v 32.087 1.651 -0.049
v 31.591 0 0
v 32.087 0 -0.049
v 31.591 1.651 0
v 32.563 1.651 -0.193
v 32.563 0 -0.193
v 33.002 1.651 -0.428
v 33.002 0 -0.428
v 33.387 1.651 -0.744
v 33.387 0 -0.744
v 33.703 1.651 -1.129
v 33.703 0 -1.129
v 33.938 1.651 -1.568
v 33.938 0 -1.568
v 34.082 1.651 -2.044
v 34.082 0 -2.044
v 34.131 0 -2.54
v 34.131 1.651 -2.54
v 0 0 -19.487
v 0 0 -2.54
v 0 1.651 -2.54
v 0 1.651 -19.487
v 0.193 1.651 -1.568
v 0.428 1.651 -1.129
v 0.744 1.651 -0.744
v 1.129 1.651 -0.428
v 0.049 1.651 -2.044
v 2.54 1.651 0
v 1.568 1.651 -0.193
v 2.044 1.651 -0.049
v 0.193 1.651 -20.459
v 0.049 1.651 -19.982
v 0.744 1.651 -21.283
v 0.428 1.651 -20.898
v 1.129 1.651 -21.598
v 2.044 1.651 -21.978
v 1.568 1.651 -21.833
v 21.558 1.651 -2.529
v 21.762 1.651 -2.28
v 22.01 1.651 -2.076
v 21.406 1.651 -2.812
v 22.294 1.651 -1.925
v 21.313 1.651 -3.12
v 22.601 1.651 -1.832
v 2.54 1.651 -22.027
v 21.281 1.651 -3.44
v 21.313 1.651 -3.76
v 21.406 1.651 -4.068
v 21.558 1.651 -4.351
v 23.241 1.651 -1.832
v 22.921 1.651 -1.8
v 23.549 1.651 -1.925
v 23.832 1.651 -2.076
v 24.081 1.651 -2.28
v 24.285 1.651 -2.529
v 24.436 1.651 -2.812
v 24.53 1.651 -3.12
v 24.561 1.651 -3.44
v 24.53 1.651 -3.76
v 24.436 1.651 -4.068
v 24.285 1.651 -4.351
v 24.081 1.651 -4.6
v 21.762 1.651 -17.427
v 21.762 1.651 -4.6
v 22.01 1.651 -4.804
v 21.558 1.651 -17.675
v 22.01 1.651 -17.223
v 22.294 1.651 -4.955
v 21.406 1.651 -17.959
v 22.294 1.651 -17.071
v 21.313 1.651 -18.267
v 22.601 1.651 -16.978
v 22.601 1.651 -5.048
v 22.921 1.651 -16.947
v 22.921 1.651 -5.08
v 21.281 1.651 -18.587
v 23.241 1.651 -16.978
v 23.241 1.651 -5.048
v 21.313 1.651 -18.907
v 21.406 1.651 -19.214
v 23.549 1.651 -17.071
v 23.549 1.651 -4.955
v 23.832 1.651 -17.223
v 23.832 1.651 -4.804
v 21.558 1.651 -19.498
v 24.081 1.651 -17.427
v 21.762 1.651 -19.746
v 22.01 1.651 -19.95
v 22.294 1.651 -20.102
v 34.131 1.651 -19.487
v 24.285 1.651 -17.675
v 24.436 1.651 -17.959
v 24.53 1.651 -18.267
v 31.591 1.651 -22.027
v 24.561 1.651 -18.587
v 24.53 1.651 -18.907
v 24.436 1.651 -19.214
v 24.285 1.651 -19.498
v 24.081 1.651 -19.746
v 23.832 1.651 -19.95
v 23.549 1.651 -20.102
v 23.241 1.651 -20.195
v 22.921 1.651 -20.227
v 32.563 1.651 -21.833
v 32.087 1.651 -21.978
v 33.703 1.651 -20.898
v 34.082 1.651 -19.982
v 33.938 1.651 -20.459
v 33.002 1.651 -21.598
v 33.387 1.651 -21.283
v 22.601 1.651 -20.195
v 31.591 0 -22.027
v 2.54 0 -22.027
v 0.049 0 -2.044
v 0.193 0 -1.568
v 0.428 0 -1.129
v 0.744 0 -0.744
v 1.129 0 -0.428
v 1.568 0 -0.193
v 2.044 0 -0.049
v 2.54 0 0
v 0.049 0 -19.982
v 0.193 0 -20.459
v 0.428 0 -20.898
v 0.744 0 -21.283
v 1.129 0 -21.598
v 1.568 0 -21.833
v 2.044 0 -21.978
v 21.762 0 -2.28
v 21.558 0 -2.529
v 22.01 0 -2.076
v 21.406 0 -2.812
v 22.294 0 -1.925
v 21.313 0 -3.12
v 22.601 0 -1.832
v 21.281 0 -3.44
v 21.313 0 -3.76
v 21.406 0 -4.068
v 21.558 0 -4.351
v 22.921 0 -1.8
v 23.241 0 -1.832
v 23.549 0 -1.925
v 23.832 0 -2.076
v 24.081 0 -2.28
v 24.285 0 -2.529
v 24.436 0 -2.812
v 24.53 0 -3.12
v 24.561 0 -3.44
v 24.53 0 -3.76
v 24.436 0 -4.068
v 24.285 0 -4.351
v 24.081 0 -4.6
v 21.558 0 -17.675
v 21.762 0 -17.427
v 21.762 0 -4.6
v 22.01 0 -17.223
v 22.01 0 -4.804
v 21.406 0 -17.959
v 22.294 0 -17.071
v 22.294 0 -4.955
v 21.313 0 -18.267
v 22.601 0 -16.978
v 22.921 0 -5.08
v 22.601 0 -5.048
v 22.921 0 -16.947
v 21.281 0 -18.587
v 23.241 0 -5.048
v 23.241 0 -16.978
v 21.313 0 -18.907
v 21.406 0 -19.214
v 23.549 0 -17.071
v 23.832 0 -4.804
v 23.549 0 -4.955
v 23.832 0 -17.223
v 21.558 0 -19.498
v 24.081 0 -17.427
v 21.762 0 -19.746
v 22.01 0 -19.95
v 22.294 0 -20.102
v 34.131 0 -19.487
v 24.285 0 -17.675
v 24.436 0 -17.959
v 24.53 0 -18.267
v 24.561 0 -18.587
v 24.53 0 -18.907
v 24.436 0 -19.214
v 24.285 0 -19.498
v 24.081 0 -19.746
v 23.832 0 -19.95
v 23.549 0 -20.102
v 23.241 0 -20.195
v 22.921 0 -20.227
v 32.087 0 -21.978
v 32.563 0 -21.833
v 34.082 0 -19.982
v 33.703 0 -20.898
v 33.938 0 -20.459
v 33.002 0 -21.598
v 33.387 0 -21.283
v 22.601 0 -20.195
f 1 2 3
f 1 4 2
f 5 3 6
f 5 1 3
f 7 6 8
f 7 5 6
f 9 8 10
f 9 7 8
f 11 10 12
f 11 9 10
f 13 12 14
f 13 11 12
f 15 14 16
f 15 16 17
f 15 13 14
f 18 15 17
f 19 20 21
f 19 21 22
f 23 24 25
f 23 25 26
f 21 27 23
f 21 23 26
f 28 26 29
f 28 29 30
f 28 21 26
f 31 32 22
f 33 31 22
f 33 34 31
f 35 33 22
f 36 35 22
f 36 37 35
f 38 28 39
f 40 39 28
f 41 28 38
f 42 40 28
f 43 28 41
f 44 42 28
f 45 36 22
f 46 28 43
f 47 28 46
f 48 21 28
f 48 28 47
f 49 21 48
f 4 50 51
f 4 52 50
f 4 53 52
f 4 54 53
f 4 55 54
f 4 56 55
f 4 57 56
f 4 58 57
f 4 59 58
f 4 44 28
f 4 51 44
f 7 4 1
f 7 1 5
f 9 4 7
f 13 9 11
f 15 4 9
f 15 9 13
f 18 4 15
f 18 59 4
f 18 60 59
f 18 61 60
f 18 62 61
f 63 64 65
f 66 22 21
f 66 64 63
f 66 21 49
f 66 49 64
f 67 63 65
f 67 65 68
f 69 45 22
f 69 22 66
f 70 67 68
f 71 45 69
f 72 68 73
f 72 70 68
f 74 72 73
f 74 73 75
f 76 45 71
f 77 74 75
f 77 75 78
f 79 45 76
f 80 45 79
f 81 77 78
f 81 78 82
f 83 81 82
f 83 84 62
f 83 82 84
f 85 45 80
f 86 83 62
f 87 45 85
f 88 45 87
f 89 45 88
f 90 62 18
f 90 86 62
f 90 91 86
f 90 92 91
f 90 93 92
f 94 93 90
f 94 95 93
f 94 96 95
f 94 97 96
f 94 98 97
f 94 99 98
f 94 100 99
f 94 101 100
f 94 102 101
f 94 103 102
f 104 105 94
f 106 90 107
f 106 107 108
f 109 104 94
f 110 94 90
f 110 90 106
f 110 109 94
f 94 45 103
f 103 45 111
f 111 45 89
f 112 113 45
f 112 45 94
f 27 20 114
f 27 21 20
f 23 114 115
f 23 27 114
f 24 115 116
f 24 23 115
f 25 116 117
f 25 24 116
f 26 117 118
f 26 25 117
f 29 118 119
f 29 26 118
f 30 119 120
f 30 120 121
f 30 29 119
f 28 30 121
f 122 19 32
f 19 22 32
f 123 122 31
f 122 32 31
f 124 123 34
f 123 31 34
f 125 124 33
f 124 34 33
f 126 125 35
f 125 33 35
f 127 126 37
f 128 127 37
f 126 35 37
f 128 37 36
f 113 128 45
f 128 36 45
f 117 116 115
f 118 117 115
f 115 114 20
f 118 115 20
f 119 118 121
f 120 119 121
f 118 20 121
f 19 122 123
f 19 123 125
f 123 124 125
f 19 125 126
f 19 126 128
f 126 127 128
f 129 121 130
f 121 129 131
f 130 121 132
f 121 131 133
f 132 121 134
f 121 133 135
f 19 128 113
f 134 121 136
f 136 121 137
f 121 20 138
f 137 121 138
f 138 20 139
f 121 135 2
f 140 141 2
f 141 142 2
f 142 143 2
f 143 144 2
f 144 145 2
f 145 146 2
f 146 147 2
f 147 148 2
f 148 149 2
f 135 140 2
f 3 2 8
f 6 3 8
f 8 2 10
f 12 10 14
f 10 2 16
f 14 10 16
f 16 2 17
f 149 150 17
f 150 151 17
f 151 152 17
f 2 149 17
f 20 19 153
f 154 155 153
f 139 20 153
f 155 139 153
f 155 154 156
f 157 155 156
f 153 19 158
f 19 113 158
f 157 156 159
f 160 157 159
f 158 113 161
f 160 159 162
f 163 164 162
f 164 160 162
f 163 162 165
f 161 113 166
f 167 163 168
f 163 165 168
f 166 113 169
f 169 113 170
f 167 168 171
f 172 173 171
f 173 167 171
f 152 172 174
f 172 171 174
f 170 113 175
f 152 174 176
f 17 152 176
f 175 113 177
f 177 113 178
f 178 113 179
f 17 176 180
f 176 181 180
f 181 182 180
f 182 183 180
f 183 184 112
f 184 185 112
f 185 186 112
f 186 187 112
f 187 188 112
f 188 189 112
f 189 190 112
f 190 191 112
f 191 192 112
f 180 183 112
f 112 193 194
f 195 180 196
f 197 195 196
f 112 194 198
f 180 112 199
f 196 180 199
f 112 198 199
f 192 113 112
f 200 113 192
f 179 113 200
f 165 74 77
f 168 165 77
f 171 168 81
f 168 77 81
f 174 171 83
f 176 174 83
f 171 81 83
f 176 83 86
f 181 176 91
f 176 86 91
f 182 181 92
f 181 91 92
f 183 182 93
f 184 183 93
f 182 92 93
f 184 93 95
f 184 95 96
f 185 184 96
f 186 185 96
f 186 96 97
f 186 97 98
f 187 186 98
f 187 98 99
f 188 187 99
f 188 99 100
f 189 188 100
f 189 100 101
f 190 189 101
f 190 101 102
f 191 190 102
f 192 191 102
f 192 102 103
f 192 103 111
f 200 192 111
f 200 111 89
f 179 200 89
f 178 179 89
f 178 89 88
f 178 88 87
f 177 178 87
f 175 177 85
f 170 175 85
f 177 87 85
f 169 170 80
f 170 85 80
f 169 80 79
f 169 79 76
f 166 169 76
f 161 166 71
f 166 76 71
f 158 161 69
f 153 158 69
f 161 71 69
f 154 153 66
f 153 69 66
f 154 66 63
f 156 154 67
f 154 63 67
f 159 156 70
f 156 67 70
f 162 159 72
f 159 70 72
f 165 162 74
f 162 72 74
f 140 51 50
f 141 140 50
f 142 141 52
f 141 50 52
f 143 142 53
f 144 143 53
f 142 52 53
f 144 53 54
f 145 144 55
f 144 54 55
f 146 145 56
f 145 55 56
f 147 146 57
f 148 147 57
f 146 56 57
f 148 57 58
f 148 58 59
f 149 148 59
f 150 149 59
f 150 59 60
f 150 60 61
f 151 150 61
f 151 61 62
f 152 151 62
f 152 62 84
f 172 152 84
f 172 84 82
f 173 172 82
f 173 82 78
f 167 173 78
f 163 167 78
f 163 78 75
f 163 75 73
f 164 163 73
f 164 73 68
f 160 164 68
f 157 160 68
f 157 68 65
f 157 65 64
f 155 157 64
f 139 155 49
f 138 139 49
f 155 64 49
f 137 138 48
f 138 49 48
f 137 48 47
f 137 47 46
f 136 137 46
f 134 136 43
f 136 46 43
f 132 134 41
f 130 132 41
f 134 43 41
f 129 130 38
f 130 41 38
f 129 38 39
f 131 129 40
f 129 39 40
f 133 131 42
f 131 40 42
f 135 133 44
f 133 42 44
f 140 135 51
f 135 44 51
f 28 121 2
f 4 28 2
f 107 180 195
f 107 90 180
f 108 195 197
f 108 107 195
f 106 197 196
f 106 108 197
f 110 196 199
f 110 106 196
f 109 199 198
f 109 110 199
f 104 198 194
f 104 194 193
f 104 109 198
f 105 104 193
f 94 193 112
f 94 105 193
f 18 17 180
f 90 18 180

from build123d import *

# Parameters (mm, degrees)
SKETCH1_W           = 34.13125
SKETCH1_H           = 22.0265625
BOSS_EXTRUDE1_DEPTH = 1.651
FILLET1_R           = 2.54
SKETCH2_R           = 1.64
CUT_EXTRUDE1_DEPTH  = 2.54


with BuildPart() as part:
    # Sketch1 → Boss-Extrude1 (new body)
    with BuildSketch(Plane(origin=(0, 0, 0), x_dir=(1, 0, 0), z_dir=(0, 1, 0))):
        with Locations((17.065625, 11.01328125)):
            Rectangle(SKETCH1_W, SKETCH1_H)
    extrude(amount=BOSS_EXTRUDE1_DEPTH)

    # Fillet1
    fillet1_edges = [part.edges().sort_by_distance(p)[0] for p in [
        (0, 0.8255, 0),
        (0, 0.8255, -22.0265625),
        (34.13125, 0.8255, -22.0265625),
        (34.13125, 0.8255, 0),
    ]]
    fillet(fillet1_edges, radius=FILLET1_R)

    # Sketch2 → Cut-Extrude1 (cut)
    with BuildSketch(Plane(origin=(0, 1.651, 0), x_dir=(1, 0, 0), z_dir=(0, 1, 0))):
        with Locations((22.92125, 18.5865625)):
            Circle(SKETCH2_R)
        with Locations((22.92125, 3.44)):
            Circle(SKETCH2_R)
    extrude(amount=-CUT_EXTRUDE1_DEPTH, mode=Mode.SUBTRACT)


solid = part.part
